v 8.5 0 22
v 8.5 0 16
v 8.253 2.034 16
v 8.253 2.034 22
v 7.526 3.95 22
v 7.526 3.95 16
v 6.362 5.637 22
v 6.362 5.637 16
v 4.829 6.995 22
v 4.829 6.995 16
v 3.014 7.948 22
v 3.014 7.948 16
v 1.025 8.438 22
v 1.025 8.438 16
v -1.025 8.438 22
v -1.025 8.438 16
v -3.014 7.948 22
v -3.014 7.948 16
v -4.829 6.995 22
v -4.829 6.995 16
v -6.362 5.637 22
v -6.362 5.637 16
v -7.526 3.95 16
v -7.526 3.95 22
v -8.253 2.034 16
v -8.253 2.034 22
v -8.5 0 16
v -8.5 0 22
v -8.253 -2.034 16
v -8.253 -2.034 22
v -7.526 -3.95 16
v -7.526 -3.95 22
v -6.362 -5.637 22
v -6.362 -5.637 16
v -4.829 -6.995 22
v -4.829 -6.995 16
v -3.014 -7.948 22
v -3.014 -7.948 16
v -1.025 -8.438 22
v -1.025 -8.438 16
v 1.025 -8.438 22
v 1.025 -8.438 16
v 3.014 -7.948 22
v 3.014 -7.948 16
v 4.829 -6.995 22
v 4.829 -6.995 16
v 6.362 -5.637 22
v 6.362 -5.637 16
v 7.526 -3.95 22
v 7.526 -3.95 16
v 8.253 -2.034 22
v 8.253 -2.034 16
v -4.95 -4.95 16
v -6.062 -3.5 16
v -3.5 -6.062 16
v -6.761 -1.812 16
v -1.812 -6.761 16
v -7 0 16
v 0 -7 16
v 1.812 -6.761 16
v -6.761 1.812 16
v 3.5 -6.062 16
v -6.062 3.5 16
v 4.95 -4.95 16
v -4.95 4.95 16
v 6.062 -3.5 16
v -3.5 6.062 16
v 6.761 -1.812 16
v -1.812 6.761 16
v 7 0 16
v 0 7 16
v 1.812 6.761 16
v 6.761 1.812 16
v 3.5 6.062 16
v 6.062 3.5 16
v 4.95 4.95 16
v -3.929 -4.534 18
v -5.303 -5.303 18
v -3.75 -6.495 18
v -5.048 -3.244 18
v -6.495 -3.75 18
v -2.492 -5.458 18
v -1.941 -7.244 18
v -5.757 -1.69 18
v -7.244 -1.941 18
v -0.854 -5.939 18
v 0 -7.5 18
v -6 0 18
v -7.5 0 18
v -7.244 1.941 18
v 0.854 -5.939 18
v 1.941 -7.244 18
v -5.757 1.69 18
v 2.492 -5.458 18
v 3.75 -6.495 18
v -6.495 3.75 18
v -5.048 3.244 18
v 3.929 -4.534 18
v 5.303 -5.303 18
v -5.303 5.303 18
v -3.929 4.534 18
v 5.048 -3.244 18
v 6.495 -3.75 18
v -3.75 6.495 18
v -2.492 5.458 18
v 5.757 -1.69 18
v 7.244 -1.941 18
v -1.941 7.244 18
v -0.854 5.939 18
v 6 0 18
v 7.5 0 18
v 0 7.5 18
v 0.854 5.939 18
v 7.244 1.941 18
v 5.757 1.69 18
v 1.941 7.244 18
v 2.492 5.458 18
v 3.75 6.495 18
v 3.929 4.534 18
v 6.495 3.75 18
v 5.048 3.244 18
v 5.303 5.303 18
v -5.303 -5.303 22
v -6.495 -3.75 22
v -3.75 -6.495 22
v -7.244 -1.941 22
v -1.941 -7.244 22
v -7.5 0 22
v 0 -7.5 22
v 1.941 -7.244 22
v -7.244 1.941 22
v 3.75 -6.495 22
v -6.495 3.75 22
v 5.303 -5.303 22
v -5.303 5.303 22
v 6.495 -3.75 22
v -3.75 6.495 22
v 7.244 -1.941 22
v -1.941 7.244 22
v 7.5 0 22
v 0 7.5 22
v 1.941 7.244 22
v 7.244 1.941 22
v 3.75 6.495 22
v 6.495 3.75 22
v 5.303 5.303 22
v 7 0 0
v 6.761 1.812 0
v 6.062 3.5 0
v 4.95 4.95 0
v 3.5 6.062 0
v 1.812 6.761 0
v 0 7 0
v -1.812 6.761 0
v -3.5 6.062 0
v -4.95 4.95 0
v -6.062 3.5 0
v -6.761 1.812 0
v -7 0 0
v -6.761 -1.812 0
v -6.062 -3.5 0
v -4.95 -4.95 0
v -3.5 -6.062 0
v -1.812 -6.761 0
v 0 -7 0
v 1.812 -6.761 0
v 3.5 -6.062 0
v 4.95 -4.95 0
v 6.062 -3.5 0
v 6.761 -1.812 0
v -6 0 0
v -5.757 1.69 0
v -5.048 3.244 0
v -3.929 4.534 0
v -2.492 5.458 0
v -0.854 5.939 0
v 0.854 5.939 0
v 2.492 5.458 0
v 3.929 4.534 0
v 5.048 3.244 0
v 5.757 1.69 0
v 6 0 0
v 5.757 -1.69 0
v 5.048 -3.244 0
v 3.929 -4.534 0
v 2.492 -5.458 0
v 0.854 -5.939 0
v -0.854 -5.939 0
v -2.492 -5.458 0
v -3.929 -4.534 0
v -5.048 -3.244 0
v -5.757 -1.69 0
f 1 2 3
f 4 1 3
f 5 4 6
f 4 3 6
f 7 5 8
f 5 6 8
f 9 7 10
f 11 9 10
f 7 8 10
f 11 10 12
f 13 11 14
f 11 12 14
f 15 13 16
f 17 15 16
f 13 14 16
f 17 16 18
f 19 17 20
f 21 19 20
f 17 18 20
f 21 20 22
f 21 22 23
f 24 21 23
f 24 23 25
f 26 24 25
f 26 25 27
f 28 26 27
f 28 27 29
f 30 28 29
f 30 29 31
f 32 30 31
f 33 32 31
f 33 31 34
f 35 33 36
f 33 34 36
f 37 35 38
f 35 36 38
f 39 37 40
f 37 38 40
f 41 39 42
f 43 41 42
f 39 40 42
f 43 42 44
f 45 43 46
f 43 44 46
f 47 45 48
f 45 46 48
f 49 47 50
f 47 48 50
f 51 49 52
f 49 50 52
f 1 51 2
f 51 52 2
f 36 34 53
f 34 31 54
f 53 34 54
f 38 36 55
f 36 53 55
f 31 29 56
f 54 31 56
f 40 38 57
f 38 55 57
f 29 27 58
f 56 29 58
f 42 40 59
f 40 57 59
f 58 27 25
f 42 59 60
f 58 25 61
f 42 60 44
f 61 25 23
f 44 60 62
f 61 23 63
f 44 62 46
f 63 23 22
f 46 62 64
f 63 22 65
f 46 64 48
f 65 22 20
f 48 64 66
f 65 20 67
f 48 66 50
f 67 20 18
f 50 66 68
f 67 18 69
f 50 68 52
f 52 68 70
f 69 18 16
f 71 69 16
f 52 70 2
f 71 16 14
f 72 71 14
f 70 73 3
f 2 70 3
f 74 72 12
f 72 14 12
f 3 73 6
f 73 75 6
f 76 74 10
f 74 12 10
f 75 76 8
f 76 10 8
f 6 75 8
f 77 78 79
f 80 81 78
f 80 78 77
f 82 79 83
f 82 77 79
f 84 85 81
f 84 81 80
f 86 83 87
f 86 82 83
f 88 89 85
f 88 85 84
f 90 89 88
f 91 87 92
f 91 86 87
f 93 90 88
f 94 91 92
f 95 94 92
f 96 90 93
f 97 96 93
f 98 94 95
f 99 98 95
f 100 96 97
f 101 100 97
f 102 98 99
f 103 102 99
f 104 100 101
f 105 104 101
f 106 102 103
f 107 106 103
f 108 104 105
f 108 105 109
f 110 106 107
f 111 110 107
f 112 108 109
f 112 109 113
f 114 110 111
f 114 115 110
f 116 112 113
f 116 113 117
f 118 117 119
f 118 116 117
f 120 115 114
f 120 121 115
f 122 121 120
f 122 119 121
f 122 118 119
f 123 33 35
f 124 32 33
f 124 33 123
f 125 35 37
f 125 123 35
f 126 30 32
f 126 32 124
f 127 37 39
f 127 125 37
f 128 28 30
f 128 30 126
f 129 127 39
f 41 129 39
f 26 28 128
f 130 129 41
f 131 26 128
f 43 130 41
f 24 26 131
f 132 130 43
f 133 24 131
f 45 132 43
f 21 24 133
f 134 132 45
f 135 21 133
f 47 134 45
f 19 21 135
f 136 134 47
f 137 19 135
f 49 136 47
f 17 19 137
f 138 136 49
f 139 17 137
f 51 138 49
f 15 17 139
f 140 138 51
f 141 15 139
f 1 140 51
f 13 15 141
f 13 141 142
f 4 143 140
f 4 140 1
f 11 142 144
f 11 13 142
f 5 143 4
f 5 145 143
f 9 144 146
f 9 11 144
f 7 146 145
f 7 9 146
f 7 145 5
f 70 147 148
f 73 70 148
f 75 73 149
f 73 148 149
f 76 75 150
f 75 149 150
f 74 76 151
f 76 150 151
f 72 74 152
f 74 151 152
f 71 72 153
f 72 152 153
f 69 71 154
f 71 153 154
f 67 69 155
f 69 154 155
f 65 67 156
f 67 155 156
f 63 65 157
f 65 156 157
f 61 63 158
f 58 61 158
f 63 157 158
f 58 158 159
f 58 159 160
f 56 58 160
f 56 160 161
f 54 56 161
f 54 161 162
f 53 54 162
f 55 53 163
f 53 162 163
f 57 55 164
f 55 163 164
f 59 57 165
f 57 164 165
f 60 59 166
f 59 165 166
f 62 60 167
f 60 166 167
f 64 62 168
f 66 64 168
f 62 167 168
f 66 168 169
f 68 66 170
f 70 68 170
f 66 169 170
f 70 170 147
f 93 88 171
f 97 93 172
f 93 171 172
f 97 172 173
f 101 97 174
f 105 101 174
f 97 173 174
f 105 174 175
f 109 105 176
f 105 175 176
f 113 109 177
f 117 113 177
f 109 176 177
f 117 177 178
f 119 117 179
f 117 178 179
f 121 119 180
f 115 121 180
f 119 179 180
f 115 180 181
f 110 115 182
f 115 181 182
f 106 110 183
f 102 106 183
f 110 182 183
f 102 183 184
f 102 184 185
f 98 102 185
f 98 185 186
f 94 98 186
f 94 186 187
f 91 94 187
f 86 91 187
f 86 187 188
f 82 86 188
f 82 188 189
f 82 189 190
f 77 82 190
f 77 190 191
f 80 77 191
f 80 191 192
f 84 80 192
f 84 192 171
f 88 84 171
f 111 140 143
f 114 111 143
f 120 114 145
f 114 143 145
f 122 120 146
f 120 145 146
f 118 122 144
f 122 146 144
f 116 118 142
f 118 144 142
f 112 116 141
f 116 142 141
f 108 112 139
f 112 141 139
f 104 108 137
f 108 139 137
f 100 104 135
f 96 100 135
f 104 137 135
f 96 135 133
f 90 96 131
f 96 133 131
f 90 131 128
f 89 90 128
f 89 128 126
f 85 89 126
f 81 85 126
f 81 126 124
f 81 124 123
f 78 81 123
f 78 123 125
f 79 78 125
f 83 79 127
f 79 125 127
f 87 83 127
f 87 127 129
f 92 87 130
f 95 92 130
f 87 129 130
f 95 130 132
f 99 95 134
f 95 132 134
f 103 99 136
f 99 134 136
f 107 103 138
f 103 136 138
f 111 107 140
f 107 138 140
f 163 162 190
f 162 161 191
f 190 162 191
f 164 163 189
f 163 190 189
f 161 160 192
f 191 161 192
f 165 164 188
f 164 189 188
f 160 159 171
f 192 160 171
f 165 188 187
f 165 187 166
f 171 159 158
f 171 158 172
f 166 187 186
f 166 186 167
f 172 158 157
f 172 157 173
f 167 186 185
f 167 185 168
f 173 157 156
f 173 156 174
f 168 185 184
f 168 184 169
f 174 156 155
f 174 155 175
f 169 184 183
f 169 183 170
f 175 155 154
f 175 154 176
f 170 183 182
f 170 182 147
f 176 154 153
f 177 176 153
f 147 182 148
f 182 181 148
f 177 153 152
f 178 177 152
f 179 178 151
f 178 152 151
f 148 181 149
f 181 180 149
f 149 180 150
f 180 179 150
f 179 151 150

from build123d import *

# Parameters (mm, degrees)
SKETCH_1_R          = 7
EXTRUDE_1_DEPTH     = 16
SKETCH_2_R          = 8.5
EXTRUDE_2_DEPTH     = 6
SKETCH_3_R          = 7.5
CUT_EXTRUDE_1_DEPTH = 4
SKETCH_4_R          = 6
CUT_EXTRUDE_2_DEPTH = 25


with BuildPart() as part:
    # 草图1 → 凸台-拉伸1 (new body)
    with BuildSketch(Plane.XY):
        Circle(SKETCH_1_R)
    extrude(amount=EXTRUDE_1_DEPTH)

    # 草图2 → 凸台-拉伸2 (add)
    with BuildSketch(Plane.XY.offset(16)):
        Circle(SKETCH_2_R)
    extrude(amount=EXTRUDE_2_DEPTH)

    # 草图3 → 切除-拉伸1 (cut)
    with BuildSketch(Plane.XY.offset(22)):
        Circle(SKETCH_3_R)
    extrude(amount=-CUT_EXTRUDE_1_DEPTH, mode=Mode.SUBTRACT)

    # 草图4 → 切除-拉伸2 (cut)
    with BuildSketch(Plane(origin=(0, 0, 0), x_dir=(-1, 0, 0), z_dir=(0, 0, -1))):
        Circle(SKETCH_4_R)
    extrude(amount=-CUT_EXTRUDE_2_DEPTH, mode=Mode.SUBTRACT)


solid = part.part
